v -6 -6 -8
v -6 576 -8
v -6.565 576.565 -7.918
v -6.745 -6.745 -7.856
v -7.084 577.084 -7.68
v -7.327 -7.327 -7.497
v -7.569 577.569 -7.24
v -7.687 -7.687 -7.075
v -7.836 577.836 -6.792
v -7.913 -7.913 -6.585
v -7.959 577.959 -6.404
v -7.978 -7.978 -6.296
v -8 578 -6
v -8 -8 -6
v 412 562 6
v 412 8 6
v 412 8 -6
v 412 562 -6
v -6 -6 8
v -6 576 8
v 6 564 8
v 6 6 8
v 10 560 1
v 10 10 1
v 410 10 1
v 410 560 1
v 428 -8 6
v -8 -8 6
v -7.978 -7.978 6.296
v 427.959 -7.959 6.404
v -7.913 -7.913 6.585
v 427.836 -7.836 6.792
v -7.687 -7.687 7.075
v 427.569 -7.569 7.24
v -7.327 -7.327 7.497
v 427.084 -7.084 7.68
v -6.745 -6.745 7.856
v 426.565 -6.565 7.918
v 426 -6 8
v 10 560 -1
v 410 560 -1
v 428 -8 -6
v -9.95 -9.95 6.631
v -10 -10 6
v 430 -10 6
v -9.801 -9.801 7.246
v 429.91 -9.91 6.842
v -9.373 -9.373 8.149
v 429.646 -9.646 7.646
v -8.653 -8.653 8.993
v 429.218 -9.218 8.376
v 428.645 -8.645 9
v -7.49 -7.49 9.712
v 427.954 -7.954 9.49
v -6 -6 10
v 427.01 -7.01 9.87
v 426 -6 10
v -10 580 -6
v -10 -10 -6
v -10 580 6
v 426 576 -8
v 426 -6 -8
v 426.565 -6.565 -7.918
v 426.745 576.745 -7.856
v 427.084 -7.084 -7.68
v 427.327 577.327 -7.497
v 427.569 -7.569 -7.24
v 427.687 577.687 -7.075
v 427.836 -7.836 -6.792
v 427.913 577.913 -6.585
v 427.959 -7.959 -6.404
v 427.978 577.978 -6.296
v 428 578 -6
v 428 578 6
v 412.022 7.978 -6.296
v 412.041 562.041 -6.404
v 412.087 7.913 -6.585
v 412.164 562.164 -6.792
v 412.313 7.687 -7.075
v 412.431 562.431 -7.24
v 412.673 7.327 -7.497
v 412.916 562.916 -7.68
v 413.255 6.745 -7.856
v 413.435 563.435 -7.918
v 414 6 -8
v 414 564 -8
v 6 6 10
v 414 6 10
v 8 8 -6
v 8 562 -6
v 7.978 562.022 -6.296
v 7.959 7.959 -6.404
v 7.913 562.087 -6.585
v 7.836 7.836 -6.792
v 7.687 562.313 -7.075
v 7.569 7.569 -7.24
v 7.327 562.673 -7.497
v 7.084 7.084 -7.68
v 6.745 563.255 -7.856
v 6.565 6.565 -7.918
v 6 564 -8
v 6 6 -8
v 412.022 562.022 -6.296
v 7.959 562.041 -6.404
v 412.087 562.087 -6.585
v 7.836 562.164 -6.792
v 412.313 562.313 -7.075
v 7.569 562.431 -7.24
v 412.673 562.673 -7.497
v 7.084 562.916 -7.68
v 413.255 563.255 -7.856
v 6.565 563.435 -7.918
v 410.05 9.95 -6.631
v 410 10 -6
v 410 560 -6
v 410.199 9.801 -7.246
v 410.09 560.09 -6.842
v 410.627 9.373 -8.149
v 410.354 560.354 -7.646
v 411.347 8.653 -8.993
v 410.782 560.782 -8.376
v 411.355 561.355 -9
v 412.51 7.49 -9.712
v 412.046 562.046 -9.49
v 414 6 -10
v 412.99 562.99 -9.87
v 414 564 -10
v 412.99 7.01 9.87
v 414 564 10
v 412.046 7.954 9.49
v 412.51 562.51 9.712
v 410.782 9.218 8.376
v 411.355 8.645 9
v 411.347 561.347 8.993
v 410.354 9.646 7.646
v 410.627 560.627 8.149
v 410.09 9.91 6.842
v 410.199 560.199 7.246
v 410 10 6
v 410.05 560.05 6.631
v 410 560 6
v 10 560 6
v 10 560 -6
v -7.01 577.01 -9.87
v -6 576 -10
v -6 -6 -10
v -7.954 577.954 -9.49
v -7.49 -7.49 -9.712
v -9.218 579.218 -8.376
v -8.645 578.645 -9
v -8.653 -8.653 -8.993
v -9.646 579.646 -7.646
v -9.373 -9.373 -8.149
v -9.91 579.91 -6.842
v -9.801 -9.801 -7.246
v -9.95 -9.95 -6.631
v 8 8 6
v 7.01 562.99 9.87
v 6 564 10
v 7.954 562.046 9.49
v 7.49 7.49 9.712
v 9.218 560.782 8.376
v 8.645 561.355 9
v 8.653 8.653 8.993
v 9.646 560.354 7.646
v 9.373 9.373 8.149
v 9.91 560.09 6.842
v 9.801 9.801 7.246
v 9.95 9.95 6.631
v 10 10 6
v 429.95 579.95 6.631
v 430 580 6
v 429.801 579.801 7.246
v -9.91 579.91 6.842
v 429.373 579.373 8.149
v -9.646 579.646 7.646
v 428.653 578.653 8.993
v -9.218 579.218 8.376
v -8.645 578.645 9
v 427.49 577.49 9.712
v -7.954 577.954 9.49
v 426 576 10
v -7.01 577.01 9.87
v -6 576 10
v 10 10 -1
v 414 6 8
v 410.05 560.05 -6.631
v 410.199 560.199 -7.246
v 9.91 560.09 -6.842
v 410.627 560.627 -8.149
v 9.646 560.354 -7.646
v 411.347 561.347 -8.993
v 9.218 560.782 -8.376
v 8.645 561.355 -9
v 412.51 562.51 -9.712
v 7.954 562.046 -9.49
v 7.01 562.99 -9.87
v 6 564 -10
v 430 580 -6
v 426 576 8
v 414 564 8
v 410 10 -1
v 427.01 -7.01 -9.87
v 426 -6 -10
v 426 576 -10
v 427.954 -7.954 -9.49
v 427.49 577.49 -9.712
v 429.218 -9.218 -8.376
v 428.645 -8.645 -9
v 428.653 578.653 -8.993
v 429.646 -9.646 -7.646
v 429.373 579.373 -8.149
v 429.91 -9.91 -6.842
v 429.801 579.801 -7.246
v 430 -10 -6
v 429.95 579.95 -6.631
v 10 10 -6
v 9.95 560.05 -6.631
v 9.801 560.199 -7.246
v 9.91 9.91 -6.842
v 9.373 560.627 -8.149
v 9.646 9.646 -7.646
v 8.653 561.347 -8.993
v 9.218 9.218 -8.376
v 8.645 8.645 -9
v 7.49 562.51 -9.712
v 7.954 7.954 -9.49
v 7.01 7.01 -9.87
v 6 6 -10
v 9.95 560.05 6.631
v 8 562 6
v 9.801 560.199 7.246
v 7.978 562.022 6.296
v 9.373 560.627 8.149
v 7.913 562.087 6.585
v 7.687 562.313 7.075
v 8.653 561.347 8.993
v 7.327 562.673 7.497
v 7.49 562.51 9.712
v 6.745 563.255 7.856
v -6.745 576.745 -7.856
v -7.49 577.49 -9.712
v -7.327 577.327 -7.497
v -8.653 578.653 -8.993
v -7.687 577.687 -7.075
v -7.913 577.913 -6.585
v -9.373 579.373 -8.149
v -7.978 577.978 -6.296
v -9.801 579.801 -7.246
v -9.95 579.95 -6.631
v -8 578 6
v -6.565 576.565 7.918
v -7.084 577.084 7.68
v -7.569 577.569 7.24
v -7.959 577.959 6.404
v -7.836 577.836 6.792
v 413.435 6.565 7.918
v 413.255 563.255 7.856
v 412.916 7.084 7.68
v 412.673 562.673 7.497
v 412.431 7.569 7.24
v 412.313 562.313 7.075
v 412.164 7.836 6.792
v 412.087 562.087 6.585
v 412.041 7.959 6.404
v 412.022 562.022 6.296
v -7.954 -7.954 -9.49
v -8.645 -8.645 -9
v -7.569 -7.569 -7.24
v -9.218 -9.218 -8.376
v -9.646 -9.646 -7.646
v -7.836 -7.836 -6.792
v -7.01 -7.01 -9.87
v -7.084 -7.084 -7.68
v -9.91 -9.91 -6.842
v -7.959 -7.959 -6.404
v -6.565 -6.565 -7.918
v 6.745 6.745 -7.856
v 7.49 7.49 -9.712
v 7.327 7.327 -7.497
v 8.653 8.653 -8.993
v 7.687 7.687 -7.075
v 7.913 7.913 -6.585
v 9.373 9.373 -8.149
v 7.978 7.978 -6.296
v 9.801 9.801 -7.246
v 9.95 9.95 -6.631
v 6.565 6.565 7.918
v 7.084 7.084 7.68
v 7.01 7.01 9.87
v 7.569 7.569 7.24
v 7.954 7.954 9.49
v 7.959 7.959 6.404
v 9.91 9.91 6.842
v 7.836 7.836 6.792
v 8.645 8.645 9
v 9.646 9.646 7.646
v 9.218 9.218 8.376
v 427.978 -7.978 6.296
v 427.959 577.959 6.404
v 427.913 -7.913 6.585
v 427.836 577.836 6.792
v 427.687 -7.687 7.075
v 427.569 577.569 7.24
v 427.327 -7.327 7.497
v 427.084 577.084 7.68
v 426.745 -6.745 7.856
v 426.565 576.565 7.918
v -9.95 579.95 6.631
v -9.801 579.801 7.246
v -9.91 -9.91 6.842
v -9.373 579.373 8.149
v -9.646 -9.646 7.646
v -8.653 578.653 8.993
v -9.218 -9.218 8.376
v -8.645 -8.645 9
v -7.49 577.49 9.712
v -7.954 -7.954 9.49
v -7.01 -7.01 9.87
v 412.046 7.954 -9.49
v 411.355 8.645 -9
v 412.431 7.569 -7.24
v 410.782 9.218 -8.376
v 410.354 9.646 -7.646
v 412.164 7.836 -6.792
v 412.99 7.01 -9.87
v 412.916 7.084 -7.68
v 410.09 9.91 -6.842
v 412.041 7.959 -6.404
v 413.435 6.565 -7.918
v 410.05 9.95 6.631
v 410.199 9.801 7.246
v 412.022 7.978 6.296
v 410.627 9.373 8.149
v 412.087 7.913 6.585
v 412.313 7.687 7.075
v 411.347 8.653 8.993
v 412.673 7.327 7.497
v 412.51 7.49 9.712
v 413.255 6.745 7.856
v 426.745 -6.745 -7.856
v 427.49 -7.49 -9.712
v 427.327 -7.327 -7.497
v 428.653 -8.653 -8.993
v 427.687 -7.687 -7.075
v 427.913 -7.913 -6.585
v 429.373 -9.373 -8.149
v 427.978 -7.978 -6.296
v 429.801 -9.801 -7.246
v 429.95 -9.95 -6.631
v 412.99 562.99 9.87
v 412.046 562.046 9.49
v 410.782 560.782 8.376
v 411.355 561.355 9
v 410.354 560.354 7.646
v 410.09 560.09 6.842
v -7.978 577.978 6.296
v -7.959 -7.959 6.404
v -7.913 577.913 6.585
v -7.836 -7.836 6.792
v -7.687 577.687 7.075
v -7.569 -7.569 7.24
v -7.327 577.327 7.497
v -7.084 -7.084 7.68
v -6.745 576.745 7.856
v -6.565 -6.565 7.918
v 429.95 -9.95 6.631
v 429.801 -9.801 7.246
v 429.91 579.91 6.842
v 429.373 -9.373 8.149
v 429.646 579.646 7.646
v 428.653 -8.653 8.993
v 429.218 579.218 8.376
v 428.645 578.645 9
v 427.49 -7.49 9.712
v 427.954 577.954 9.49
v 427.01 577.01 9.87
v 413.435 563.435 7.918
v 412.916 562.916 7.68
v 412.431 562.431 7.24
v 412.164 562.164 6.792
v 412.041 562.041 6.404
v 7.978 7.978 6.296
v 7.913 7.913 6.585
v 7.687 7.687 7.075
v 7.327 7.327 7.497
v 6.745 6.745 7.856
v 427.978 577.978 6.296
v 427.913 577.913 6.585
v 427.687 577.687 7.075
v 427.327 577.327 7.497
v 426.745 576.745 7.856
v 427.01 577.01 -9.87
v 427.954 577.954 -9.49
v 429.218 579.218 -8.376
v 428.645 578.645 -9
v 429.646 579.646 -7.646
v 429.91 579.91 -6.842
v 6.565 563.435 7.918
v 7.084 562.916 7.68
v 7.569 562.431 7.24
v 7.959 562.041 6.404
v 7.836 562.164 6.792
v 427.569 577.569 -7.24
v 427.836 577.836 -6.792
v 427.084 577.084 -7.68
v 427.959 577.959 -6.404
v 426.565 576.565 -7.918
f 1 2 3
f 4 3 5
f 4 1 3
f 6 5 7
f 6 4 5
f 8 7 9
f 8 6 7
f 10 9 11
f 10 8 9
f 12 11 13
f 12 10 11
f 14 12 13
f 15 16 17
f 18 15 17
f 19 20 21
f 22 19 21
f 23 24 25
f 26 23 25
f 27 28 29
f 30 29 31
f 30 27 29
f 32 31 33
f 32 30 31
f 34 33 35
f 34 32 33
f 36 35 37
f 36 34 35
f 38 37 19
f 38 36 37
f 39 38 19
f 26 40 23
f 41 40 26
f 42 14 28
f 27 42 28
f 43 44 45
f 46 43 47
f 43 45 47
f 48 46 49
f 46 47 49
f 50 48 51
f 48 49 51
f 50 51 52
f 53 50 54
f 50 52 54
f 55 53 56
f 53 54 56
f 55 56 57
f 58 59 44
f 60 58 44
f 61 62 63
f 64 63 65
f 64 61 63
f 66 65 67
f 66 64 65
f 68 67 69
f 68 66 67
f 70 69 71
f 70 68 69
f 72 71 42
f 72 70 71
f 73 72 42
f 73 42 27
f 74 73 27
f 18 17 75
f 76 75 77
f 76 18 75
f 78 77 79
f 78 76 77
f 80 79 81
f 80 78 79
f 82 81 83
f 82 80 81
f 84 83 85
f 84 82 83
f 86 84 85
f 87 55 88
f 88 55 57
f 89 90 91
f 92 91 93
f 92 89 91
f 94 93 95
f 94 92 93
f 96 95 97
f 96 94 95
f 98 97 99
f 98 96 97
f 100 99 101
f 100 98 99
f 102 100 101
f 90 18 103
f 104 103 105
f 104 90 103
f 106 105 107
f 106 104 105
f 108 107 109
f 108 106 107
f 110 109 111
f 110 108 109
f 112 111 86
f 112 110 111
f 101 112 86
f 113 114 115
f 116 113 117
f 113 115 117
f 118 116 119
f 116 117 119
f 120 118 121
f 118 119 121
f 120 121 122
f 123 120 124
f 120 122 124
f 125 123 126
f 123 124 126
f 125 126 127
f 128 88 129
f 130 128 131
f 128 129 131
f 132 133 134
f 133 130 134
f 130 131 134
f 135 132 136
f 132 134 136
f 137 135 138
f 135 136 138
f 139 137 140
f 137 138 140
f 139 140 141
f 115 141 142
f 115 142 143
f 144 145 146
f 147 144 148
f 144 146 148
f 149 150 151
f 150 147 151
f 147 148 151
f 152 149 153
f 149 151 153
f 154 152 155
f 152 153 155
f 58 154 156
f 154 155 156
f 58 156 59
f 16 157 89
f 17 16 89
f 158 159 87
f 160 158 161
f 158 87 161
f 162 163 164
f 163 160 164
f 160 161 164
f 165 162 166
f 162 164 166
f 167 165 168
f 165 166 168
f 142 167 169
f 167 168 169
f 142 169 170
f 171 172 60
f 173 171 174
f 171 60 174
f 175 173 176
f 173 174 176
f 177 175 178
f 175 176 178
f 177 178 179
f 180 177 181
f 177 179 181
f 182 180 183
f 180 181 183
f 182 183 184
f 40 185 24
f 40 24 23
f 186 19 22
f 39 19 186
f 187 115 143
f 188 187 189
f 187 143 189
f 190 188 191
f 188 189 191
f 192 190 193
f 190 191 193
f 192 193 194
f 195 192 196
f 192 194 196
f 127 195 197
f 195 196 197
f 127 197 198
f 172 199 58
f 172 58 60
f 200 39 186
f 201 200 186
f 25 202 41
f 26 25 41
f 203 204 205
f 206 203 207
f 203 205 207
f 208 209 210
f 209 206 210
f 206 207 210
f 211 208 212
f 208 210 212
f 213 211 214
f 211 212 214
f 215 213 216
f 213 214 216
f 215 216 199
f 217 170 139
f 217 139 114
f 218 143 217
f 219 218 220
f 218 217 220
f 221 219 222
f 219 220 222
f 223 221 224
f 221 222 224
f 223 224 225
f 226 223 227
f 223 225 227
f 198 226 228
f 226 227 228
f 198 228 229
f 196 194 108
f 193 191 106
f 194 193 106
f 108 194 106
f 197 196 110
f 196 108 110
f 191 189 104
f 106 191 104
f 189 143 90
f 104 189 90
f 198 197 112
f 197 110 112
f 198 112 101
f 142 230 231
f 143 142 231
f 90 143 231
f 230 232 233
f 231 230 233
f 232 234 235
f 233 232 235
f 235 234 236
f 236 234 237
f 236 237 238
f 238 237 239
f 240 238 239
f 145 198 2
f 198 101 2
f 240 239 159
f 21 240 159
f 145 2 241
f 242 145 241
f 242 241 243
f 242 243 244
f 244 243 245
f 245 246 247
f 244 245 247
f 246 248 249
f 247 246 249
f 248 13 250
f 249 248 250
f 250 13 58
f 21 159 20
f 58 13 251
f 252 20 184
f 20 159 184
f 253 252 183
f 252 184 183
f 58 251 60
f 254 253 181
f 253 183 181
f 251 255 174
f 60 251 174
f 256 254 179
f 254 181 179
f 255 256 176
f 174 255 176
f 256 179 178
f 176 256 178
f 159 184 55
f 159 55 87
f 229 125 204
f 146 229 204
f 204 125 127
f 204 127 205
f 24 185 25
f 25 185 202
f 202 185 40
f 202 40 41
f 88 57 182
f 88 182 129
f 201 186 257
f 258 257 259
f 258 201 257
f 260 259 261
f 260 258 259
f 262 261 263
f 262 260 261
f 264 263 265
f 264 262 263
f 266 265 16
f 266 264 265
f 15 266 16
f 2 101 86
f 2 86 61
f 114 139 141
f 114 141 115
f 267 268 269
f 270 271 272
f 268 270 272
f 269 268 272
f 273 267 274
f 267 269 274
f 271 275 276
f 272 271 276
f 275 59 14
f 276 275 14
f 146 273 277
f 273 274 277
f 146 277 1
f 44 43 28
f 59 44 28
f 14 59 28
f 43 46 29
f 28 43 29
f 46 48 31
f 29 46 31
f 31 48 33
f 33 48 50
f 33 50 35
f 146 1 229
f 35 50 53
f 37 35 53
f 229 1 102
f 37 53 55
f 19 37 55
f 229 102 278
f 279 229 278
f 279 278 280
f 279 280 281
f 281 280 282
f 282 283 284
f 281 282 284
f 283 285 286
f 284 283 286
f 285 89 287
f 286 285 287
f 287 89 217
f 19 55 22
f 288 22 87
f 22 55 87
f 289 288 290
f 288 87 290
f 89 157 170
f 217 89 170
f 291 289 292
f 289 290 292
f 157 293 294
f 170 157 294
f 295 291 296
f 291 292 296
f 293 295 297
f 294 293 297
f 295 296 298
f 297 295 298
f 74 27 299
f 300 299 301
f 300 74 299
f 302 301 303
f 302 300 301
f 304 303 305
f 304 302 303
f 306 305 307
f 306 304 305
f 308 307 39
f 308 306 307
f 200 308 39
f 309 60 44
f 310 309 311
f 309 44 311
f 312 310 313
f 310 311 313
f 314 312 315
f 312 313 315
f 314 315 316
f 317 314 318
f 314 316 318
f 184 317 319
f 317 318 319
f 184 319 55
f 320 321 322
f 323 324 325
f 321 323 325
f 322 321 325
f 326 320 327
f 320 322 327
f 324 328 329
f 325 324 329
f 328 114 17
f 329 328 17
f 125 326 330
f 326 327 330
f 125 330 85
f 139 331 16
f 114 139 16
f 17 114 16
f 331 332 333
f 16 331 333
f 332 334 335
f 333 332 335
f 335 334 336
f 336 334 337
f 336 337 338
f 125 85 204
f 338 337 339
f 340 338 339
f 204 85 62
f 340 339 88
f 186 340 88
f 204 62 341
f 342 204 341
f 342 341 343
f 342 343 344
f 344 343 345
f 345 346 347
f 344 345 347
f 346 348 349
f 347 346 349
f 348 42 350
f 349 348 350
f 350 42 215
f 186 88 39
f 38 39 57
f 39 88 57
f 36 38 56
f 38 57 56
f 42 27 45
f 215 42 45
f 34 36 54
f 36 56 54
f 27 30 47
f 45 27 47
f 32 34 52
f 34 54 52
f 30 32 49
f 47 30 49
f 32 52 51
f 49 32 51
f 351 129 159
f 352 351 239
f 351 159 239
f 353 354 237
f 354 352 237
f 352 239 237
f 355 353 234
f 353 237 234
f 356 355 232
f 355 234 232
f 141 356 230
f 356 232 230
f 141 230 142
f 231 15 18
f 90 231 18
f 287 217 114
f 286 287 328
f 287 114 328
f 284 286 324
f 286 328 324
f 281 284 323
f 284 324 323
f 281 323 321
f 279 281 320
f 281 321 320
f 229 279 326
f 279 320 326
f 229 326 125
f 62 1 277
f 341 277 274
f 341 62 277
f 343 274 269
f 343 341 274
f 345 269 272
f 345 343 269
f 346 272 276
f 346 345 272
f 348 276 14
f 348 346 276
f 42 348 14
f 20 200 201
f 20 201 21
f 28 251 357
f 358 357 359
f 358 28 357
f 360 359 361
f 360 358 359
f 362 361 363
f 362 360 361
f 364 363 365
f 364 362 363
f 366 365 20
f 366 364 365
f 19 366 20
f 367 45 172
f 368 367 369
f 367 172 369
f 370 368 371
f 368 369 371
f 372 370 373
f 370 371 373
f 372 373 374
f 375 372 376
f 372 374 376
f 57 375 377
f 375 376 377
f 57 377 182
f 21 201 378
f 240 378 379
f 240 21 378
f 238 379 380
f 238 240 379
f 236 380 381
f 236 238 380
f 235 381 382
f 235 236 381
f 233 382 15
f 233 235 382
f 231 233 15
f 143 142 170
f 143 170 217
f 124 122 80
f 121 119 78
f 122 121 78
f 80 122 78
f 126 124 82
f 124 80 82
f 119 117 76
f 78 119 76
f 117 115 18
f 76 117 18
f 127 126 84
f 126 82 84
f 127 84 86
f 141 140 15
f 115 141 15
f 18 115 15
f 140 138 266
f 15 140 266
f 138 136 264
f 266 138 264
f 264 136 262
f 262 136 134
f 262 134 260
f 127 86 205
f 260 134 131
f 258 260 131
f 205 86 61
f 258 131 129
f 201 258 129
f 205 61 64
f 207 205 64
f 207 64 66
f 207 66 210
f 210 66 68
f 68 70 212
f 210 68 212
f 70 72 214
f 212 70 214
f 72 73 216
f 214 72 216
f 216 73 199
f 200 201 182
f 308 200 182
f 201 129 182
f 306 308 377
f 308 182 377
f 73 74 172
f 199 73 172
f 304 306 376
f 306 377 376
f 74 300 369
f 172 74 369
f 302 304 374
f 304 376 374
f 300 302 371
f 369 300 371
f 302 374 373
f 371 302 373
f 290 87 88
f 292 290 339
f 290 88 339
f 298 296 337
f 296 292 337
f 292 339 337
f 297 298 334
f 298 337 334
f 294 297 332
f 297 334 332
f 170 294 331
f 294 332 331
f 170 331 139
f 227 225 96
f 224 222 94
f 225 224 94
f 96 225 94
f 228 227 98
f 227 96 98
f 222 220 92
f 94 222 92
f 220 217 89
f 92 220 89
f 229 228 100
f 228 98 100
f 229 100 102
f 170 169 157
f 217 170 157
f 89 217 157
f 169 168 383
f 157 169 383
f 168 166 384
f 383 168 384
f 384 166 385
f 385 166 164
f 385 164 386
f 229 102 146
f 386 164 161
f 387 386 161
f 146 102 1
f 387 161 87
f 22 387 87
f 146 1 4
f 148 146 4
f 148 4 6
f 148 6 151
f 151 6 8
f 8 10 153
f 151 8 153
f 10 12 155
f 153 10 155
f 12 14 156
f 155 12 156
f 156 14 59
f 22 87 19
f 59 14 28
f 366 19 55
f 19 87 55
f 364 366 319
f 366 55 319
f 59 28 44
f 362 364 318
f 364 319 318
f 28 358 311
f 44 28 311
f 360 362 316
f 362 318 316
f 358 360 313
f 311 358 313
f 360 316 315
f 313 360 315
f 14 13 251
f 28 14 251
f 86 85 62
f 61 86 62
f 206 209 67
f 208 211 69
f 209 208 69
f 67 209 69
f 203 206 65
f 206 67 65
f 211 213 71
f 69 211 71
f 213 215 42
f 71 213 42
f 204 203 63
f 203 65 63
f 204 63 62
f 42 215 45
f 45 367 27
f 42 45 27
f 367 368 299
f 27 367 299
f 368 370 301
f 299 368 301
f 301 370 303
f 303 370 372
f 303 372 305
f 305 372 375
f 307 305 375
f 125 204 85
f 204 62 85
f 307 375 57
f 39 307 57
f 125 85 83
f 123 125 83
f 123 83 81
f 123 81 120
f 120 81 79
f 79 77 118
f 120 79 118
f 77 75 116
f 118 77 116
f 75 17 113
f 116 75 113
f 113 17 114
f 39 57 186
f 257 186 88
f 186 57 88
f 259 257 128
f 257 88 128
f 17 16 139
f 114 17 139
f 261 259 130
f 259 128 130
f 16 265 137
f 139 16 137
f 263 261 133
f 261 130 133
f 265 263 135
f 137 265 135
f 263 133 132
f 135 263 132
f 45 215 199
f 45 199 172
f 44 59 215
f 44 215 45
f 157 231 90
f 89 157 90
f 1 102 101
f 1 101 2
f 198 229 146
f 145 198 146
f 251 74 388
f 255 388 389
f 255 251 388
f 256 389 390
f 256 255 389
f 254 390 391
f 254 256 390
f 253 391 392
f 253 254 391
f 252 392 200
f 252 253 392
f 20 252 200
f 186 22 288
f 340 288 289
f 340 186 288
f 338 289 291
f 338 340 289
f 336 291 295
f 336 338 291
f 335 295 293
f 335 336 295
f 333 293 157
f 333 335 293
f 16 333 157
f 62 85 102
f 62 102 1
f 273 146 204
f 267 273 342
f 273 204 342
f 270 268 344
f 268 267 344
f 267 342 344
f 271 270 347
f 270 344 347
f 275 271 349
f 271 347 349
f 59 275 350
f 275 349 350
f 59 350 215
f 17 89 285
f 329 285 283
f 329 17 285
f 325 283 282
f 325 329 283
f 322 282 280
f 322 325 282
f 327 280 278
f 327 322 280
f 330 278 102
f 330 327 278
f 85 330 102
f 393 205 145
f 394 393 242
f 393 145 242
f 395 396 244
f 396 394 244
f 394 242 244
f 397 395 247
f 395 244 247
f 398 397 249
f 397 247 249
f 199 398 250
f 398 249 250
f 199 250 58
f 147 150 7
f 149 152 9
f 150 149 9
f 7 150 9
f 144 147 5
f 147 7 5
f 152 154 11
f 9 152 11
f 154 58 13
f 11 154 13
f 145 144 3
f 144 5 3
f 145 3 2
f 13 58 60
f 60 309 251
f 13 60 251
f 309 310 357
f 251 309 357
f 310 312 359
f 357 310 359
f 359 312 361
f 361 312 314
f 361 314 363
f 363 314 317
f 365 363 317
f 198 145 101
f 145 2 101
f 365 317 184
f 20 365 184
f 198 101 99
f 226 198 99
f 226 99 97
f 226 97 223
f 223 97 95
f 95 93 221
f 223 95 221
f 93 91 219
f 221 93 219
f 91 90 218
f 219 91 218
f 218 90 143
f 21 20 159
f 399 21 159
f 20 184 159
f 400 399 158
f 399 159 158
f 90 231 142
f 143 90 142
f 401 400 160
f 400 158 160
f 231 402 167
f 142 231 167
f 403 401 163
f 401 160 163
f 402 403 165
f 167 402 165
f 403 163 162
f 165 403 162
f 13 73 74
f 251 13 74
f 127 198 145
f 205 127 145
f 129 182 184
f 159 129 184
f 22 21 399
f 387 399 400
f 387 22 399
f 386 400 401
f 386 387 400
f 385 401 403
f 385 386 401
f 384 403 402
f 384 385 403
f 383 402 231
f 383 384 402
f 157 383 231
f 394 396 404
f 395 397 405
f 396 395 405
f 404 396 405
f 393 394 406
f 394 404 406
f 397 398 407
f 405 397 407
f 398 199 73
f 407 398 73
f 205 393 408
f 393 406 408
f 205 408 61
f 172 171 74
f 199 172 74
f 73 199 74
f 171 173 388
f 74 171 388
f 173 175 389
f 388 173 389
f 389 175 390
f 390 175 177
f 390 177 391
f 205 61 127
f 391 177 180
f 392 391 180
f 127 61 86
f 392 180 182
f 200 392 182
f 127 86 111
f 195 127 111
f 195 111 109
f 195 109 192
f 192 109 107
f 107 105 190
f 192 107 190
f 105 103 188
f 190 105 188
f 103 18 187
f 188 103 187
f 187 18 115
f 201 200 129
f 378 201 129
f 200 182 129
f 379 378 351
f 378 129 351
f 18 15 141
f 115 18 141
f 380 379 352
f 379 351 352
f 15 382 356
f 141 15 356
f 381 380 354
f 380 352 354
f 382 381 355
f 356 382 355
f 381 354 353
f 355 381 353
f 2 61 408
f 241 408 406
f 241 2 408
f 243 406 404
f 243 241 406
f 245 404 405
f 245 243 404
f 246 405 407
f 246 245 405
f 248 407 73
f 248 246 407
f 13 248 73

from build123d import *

# Parameters (mm, degrees)
RURA_KWADRATOWA_20_X_20_X_2_1_DEPTH      = 585.142135624
RURA_KWADRATOWA_20_X_20_X_2_1_DEPTH_BACK = 15.142135624
RURA_KWADRATOWA_20_X_20_X_2_1_2_DEPTH    = 450.284271247
RURA_KWADRATOWA_20_X_20_X_2_1_3_DEPTH    = 600.284271247
RURA_KWADRATOWA_20_X_20_X_2_1_4_DEPTH    = 450.284271247
DODANIE_WYCI_GNI_CIE1_DEPTH              = 1
DODANIE_WYCI_GNI_CIE1_DEPTH_BACK         = 1
SZKIC9_W                                 = 400
SZKIC9_H                                 = 550


with BuildPart() as part:
    # Sketch1 → Rura kwadratowa 20 X 20 X 2(1) (new, two sides: drawn at the far end of the back side and taken through both)
    with BuildSketch(Plane(origin=(0, 0, 0), x_dir=(1, 0, 0), z_dir=(0, 1, 0)).offset(-RURA_KWADRATOWA_20_X_20_X_2_1_DEPTH_BACK)):
        with BuildLine():
            Line((-6, -10), (6, -10))
            ThreePointArc((6, -10), (8.828427125, -8.828427125), (10, -6))
            Line((10, -6), (10, 6))
            ThreePointArc((10, 6), (8.828427125, 8.828427125), (6, 10))
            Line((6, 10), (-6, 10))
            ThreePointArc((-6, 10), (-8.828427125, 8.828427125), (-10, 6))
            Line((-10, 6), (-10, -6))
            ThreePointArc((-10, -6), (-8.828427125, -8.828427125), (-6, -10))
        make_face()
        with BuildLine():
            Line((-6, -8), (6, -8))
            ThreePointArc((6, -8), (7.414213562, -7.414213562), (8, -6))
            Line((8, -6), (8, 6))
            ThreePointArc((8, 6), (7.414213562, 7.414213562), (6, 8))
            Line((6, 8), (-6, 8))
            ThreePointArc((-6, 8), (-7.414213562, 7.414213562), (-8, 6))
            Line((-8, 6), (-8, -6))
            ThreePointArc((-8, -6), (-7.414213562, -7.414213562), (-6, -8))
        make_face(mode=Mode.SUBTRACT)
    extrude(amount=RURA_KWADRATOWA_20_X_20_X_2_1_DEPTH + RURA_KWADRATOWA_20_X_20_X_2_1_DEPTH_BACK)

    # Rura kwadratowa 20 X 20 X 2(1) mitre 1
    split(bisect_by=Plane(origin=(0, 0, 0), x_dir=(-0.707106781, -0.707106781, 0), z_dir=(-0.707106781, 0.707106781, 0)), keep=Keep.TOP)

    # Rura kwadratowa 20 X 20 X 2(1) mitre 2
    split(bisect_by=Plane(origin=(0, 570, 0), x_dir=(0.707106781, -0.707106781, 0), z_dir=(-0.707106781, -0.707106781, 0)), keep=Keep.TOP)


with BuildPart() as body_2:
    # Sketch1 on segment 2 (carried to segment 2) → Rura kwadratowa 20 X 20 X 2_1 2 (new body)
    with BuildSketch(Plane(origin=(-15.142135624, 570, 0), x_dir=(0, -1, 0), z_dir=(1, 0, 0))):
        with BuildLine():
            Line((-6, -10), (6, -10))
            ThreePointArc((6, -10), (8.828427125, -8.828427125), (10, -6))
            Line((10, -6), (10, 6))
            ThreePointArc((10, 6), (8.828427125, 8.828427125), (6, 10))
            Line((6, 10), (-6, 10))
            ThreePointArc((-6, 10), (-8.828427125, 8.828427125), (-10, 6))
            Line((-10, 6), (-10, -6))
            ThreePointArc((-10, -6), (-8.828427125, -8.828427125), (-6, -10))
        make_face()
        with BuildLine():
            Line((-6, -8), (6, -8))
            ThreePointArc((6, -8), (7.414213562, -7.414213562), (8, -6))
            Line((8, -6), (8, 6))
            ThreePointArc((8, 6), (7.414213562, 7.414213562), (6, 8))
            Line((6, 8), (-6, 8))
            ThreePointArc((-6, 8), (-7.414213562, 7.414213562), (-8, 6))
            Line((-8, 6), (-8, -6))
            ThreePointArc((-8, -6), (-7.414213562, -7.414213562), (-6, -8))
        make_face(mode=Mode.SUBTRACT)
    extrude(amount=RURA_KWADRATOWA_20_X_20_X_2_1_2_DEPTH)

    # Rura kwadratowa 20 X 20 X 2_1 2 mitre 1
    split(bisect_by=Plane(origin=(0, 570, 0), x_dir=(-0.707106781, 0.707106781, 0), z_dir=(0.707106781, 0.707106781, 0)), keep=Keep.TOP)

    # Rura kwadratowa 20 X 20 X 2_1 2 mitre 2
    split(bisect_by=Plane(origin=(420, 570, 0), x_dir=(-0.707106781, -0.707106781, 0), z_dir=(-0.707106781, 0.707106781, 0)), keep=Keep.TOP)


with BuildPart() as body_3:
    # Sketch1 on segment 3 (carried to segment 3) → Rura kwadratowa 20 X 20 X 2_1 3 (new body)
    with BuildSketch(Plane(origin=(420, 585.142135624, 0), x_dir=(-1, 0, 0), z_dir=(0, -1, 0))):
        with BuildLine():
            Line((-6, -10), (6, -10))
            ThreePointArc((6, -10), (8.828427125, -8.828427125), (10, -6))
            Line((10, -6), (10, 6))
            ThreePointArc((10, 6), (8.828427125, 8.828427125), (6, 10))
            Line((6, 10), (-6, 10))
            ThreePointArc((-6, 10), (-8.828427125, 8.828427125), (-10, 6))
            Line((-10, 6), (-10, -6))
            ThreePointArc((-10, -6), (-8.828427125, -8.828427125), (-6, -10))
        make_face()
        with BuildLine():
            Line((-6, -8), (6, -8))
            ThreePointArc((6, -8), (7.414213562, -7.414213562), (8, -6))
            Line((8, -6), (8, 6))
            ThreePointArc((8, 6), (7.414213562, 7.414213562), (6, 8))
            Line((6, 8), (-6, 8))
            ThreePointArc((-6, 8), (-7.414213562, 7.414213562), (-8, 6))
            Line((-8, 6), (-8, -6))
            ThreePointArc((-8, -6), (-7.414213562, -7.414213562), (-6, -8))
        make_face(mode=Mode.SUBTRACT)
    extrude(amount=RURA_KWADRATOWA_20_X_20_X_2_1_3_DEPTH)

    # Rura kwadratowa 20 X 20 X 2_1 3 mitre 1
    split(bisect_by=Plane(origin=(420, 0, 0), x_dir=(-0.707106781, 0.707106781, 0), z_dir=(0.707106781, 0.707106781, 0)), keep=Keep.TOP)

    # Rura kwadratowa 20 X 20 X 2_1 3 mitre 2
    split(bisect_by=Plane(origin=(420, 570, 0), x_dir=(0.707106781, 0.707106781, 0), z_dir=(0.707106781, -0.707106781, 0)), keep=Keep.TOP)


with BuildPart() as body_4:
    # Sketch1 on segment 4 (carried to segment 4) → Rura kwadratowa 20 X 20 X 2_1 4 (new body)
    with BuildSketch(Plane(origin=(435.142135624, 0, 0), x_dir=(0, 1, 0), z_dir=(-1, 0, 0))):
        with BuildLine():
            Line((-6, -10), (6, -10))
            ThreePointArc((6, -10), (8.828427125, -8.828427125), (10, -6))
            Line((10, -6), (10, 6))
            ThreePointArc((10, 6), (8.828427125, 8.828427125), (6, 10))
            Line((6, 10), (-6, 10))
            ThreePointArc((-6, 10), (-8.828427125, 8.828427125), (-10, 6))
            Line((-10, 6), (-10, -6))
            ThreePointArc((-10, -6), (-8.828427125, -8.828427125), (-6, -10))
        make_face()
        with BuildLine():
            Line((-6, -8), (6, -8))
            ThreePointArc((6, -8), (7.414213562, -7.414213562), (8, -6))
            Line((8, -6), (8, 6))
            ThreePointArc((8, 6), (7.414213562, 7.414213562), (6, 8))
            Line((6, 8), (-6, 8))
            ThreePointArc((-6, 8), (-7.414213562, 7.414213562), (-8, 6))
            Line((-8, 6), (-8, -6))
            ThreePointArc((-8, -6), (-7.414213562, -7.414213562), (-6, -8))
        make_face(mode=Mode.SUBTRACT)
    extrude(amount=RURA_KWADRATOWA_20_X_20_X_2_1_4_DEPTH)

    # Rura kwadratowa 20 X 20 X 2_1 4 mitre 1
    split(bisect_by=Plane(origin=(0, 0, 0), x_dir=(0.707106781, 0.707106781, 0), z_dir=(0.707106781, -0.707106781, 0)), keep=Keep.TOP)

    # Rura kwadratowa 20 X 20 X 2_1 4 mitre 2
    split(bisect_by=Plane(origin=(420, 0, 0), x_dir=(0.707106781, -0.707106781, 0), z_dir=(-0.707106781, -0.707106781, 0)), keep=Keep.TOP)


with BuildPart() as body_5:
    # Szkic9 → Dodanie-wyciągnięcie1 (new, two sides: drawn at the far end of the back side and taken through both)
    with BuildSketch(Plane.XY.offset(-DODANIE_WYCI_GNI_CIE1_DEPTH_BACK)):
        with Locations((210, 285)):
            Rectangle(SZKIC9_W, SZKIC9_H)
    extrude(amount=DODANIE_WYCI_GNI_CIE1_DEPTH + DODANIE_WYCI_GNI_CIE1_DEPTH_BACK)


solid = Compound([part.part, body_2.part, body_3.part, body_4.part, body_5.part])
